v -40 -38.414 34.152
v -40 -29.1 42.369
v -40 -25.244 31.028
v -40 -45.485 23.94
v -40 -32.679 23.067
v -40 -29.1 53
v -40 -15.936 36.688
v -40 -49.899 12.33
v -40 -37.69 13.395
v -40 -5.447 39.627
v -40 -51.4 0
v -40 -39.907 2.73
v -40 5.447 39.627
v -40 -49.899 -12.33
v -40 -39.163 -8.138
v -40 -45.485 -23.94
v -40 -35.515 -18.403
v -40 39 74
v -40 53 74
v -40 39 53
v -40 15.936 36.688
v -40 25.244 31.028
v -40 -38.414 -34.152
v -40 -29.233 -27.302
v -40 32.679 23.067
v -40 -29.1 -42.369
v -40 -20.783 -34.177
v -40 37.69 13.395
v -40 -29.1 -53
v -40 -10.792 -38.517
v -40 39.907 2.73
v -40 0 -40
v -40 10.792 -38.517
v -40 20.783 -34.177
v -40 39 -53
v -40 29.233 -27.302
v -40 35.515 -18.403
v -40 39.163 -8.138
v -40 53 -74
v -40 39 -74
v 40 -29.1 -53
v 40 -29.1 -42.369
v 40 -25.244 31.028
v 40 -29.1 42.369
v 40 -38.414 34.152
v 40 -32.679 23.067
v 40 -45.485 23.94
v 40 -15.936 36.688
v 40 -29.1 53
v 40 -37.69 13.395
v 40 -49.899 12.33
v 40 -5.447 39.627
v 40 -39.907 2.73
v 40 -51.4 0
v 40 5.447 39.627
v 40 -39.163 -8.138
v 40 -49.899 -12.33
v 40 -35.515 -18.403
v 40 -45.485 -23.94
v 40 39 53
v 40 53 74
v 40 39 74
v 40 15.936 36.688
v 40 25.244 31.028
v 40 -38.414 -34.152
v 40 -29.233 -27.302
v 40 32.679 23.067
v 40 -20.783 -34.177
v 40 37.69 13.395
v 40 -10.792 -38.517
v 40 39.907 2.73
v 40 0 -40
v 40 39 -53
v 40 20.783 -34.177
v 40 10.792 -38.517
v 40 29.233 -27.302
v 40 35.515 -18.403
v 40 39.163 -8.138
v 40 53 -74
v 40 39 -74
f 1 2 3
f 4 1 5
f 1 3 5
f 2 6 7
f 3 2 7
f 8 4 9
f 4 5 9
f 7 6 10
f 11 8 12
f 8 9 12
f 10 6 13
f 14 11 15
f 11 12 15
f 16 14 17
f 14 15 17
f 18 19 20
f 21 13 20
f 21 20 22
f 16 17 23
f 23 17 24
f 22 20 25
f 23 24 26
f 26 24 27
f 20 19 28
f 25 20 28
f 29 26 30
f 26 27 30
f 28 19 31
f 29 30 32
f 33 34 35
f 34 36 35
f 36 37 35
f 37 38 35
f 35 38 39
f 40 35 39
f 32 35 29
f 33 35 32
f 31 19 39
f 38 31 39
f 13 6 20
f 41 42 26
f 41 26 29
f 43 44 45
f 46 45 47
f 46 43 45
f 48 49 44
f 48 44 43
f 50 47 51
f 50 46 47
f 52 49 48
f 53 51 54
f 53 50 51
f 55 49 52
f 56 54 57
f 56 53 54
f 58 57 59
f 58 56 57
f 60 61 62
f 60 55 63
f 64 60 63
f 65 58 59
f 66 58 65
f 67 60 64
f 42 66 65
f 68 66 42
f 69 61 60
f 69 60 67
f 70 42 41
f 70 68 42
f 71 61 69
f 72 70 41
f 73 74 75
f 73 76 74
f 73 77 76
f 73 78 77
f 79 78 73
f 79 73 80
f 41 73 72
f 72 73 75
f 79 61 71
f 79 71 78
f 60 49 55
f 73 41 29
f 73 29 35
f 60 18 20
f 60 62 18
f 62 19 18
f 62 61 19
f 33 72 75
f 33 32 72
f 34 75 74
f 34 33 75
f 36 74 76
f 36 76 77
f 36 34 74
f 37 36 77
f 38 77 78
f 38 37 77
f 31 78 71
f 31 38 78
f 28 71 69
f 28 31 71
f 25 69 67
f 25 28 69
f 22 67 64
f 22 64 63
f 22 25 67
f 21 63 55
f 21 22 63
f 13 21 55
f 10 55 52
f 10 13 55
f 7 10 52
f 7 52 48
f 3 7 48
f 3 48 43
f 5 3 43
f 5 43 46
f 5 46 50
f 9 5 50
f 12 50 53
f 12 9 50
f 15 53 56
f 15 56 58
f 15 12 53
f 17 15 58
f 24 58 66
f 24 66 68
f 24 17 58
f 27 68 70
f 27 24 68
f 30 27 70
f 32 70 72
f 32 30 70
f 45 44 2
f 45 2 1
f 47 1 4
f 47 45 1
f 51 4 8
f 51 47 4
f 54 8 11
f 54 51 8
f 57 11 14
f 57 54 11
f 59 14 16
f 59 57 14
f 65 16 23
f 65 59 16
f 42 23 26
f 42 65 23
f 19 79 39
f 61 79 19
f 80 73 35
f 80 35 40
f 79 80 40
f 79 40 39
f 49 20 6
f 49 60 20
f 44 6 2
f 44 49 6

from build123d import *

# Parameters (mm, degrees)
SKETCH1_R           = 40
BOSS_EXTRUDE1_DEPTH = 40


with BuildPart() as part:
    # Sketch1 → Boss-Extrude1 (new, symmetric)
    with BuildSketch(Plane(origin=(0, 0, 0), x_dir=(0, 0, -1), z_dir=(1, 0, 0))):
        with BuildLine():
            Line((-53, -29.1), (-42.369210519, -29.1))
            ThreePointArc((-42.369210519, -29.1), (0, -51.4), (42.369210519, -29.1))
            Line((42.369210519, -29.1), (53, -29.1))
            Line((53, -29.1), (53, 39))
            Line((53, 39), (74, 39))
            Line((74, 39), (74, 53))
            Line((74, 53), (-74, 53))
            Line((-74, 53), (-74, 39))
            Line((-74, 39), (-53, 39))
            Line((-53, 39), (-53, -29.1))
        make_face()
        Circle(SKETCH1_R, mode=Mode.SUBTRACT)
    extrude(amount=BOSS_EXTRUDE1_DEPTH, both=True)


solid = part.part
